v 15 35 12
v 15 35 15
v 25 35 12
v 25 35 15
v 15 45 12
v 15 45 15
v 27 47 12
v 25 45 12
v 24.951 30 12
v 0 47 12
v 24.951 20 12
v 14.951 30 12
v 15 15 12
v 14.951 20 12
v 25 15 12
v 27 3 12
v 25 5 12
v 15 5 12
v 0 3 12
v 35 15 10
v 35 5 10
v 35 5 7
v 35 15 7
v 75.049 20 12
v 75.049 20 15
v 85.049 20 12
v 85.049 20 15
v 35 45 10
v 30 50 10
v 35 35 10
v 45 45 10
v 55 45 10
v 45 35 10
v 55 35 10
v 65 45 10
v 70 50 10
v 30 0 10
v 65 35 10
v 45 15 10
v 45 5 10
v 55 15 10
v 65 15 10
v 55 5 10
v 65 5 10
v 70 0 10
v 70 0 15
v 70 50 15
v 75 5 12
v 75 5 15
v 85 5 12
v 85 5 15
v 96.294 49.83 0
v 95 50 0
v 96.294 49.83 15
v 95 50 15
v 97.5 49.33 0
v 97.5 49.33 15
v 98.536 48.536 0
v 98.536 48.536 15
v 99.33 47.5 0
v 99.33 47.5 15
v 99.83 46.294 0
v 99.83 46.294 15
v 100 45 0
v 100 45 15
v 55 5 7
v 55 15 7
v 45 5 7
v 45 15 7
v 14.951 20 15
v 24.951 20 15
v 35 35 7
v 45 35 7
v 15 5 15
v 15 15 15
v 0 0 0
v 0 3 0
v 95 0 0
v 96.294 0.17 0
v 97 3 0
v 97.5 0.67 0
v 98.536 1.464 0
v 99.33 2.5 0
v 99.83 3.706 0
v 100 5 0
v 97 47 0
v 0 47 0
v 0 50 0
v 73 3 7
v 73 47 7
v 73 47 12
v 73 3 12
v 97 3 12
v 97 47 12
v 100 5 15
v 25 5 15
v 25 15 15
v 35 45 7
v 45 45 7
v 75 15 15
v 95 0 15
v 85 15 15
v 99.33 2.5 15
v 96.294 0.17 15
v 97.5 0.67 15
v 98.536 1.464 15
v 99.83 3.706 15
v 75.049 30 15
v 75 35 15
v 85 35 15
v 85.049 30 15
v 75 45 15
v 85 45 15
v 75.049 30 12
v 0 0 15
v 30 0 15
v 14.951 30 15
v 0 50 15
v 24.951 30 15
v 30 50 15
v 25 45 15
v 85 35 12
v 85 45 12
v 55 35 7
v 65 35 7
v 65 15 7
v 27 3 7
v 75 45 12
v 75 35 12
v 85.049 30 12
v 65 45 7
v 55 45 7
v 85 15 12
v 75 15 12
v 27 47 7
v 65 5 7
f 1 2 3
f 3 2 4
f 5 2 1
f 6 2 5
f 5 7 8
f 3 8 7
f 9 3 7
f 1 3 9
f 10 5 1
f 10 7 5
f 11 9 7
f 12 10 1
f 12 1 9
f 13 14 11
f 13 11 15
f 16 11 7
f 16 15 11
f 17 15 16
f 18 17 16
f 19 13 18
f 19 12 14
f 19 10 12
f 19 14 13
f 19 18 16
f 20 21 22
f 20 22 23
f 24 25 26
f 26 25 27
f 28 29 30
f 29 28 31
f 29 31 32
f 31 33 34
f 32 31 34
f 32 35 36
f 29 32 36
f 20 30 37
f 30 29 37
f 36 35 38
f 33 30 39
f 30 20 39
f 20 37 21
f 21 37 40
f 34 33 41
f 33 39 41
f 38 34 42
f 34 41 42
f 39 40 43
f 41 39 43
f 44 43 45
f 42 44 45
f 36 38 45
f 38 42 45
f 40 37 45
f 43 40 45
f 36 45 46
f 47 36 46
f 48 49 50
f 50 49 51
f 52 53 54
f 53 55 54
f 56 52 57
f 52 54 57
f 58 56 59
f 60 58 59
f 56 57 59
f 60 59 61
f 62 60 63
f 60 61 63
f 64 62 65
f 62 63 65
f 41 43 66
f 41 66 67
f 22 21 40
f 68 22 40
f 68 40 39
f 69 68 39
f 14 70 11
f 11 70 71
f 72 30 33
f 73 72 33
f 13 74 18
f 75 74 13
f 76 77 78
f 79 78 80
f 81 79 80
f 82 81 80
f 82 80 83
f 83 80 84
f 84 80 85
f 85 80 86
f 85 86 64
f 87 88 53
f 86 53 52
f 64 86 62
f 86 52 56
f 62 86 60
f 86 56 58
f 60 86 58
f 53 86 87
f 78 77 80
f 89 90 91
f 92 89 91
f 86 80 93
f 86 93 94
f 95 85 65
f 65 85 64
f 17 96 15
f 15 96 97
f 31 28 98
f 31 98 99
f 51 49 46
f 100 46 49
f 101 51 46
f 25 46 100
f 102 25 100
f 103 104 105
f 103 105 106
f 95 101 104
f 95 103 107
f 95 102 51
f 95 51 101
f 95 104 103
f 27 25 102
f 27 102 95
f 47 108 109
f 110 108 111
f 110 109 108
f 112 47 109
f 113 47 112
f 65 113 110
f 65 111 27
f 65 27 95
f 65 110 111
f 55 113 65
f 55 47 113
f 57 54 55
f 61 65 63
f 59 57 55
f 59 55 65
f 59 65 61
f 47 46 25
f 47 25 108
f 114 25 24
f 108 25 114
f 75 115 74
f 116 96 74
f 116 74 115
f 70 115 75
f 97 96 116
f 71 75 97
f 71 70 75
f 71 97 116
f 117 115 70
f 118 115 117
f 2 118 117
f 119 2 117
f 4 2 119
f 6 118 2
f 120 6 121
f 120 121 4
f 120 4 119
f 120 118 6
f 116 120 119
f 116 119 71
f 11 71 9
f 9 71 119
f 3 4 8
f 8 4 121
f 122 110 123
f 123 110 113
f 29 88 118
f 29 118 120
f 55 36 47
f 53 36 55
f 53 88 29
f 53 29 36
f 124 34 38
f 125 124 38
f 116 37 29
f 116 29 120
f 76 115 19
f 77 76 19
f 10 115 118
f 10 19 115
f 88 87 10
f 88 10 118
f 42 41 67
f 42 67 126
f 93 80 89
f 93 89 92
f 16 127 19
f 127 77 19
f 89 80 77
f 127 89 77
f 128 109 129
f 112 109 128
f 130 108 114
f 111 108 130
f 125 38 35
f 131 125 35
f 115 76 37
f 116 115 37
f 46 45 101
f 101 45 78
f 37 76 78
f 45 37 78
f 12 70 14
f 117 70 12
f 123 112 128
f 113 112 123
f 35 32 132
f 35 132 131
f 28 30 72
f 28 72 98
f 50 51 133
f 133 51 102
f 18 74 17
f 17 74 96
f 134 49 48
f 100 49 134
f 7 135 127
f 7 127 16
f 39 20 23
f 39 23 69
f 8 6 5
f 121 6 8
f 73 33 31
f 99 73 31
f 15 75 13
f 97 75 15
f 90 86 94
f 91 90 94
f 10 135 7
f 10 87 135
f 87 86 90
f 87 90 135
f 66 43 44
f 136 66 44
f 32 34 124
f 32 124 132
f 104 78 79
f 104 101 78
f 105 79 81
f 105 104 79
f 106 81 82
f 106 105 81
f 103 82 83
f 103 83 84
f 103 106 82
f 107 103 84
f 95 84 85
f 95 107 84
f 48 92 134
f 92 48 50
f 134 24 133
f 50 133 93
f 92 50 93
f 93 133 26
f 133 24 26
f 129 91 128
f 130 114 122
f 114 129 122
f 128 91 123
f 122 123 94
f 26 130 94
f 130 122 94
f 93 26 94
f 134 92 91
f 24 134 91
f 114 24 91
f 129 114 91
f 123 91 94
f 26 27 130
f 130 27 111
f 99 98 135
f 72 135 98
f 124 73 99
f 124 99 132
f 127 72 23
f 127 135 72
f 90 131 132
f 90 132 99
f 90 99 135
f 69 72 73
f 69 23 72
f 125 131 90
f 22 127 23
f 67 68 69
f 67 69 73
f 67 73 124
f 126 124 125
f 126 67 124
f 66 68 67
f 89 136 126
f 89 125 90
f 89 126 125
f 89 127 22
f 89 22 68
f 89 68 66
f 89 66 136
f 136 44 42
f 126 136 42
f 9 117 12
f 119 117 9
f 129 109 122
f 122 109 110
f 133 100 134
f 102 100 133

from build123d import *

# Parameters (mm, degrees)
F1_W      = 100
F1_H      = 50
F2_DEPTH  = 15
F3_W      = 40
F3_H      = 5
F4_DEPTH  = 50
F5_T      = -3
F6_W      = 44
F6_H      = 12
F7_DEPTH  = 3
F9_W      = 10
F9_H      = 10
F10_DEPTH = 15.001
F11_R     = 5


with BuildPart() as f2:
    # F1 (on Top) → F2 (new body)
    with BuildSketch(Plane.XY):
        with Locations((50, 25)):
            Rectangle(F1_W, F1_H)
    extrude(amount=F2_DEPTH)

    # F3 (on Front) → F4 (cut, through all)
    with BuildSketch(Plane.XZ):
        with Locations((50, 12.5)):
            Rectangle(F3_W, F3_H)
    extrude(amount=-F4_DEPTH, mode=Mode.SUBTRACT)

    # F5
    f5_openings = [f2.faces().sort_by_distance(p)[0] for p in [
        (50, 25, 0),
    ]]
    offset(amount=F5_T, openings=f5_openings, kind=Kind.INTERSECTION)

    # F6 (on face) → F7 (cut, through all)
    with BuildSketch(Plane(origin=(0, 0, 0), x_dir=(0, -1, 0), z_dir=(-1, 0, 0))):
        with Locations((-25, 6)):
            Rectangle(F6_W, F6_H)
    extrude(amount=-F7_DEPTH, mode=Mode.SUBTRACT)

    # F9 (on offset) → F10 (cut, through all)
    with BuildSketch(Plane.XY.offset(15)):
        with Locations((80, 40)):
            Rectangle(F9_W, F9_H)
        with Locations((80, 10)):
            Rectangle(F9_W, F9_H)
        with Locations((80.0488266349, 25)):
            Rectangle(F9_W, F9_H)
        with Locations((20, 40)):
            Rectangle(F9_W, F9_H)
        with Locations((19.9511733651, 25)):
            Rectangle(F9_W, F9_H)
        with Locations((20, 10)):
            Rectangle(F9_W, F9_H)
        with Locations((60, 40)):
            Rectangle(F9_W, F9_H)
        with Locations((60, 10)):
            Rectangle(F9_W, F9_H)
        with Locations((40, 40)):
            Rectangle(F9_W, F9_H)
        with Locations((40, 10)):
            Rectangle(F9_W, F9_H)
    extrude(amount=-F10_DEPTH, mode=Mode.SUBTRACT)

    # F11
    f11_edges = [f2.edges().sort_by_distance(p)[0] for p in [
        (100, 0, 7.5),
        (100, 50, 7.5),
    ]]
    fillet(f11_edges, radius=F11_R)


solid = f2.part
